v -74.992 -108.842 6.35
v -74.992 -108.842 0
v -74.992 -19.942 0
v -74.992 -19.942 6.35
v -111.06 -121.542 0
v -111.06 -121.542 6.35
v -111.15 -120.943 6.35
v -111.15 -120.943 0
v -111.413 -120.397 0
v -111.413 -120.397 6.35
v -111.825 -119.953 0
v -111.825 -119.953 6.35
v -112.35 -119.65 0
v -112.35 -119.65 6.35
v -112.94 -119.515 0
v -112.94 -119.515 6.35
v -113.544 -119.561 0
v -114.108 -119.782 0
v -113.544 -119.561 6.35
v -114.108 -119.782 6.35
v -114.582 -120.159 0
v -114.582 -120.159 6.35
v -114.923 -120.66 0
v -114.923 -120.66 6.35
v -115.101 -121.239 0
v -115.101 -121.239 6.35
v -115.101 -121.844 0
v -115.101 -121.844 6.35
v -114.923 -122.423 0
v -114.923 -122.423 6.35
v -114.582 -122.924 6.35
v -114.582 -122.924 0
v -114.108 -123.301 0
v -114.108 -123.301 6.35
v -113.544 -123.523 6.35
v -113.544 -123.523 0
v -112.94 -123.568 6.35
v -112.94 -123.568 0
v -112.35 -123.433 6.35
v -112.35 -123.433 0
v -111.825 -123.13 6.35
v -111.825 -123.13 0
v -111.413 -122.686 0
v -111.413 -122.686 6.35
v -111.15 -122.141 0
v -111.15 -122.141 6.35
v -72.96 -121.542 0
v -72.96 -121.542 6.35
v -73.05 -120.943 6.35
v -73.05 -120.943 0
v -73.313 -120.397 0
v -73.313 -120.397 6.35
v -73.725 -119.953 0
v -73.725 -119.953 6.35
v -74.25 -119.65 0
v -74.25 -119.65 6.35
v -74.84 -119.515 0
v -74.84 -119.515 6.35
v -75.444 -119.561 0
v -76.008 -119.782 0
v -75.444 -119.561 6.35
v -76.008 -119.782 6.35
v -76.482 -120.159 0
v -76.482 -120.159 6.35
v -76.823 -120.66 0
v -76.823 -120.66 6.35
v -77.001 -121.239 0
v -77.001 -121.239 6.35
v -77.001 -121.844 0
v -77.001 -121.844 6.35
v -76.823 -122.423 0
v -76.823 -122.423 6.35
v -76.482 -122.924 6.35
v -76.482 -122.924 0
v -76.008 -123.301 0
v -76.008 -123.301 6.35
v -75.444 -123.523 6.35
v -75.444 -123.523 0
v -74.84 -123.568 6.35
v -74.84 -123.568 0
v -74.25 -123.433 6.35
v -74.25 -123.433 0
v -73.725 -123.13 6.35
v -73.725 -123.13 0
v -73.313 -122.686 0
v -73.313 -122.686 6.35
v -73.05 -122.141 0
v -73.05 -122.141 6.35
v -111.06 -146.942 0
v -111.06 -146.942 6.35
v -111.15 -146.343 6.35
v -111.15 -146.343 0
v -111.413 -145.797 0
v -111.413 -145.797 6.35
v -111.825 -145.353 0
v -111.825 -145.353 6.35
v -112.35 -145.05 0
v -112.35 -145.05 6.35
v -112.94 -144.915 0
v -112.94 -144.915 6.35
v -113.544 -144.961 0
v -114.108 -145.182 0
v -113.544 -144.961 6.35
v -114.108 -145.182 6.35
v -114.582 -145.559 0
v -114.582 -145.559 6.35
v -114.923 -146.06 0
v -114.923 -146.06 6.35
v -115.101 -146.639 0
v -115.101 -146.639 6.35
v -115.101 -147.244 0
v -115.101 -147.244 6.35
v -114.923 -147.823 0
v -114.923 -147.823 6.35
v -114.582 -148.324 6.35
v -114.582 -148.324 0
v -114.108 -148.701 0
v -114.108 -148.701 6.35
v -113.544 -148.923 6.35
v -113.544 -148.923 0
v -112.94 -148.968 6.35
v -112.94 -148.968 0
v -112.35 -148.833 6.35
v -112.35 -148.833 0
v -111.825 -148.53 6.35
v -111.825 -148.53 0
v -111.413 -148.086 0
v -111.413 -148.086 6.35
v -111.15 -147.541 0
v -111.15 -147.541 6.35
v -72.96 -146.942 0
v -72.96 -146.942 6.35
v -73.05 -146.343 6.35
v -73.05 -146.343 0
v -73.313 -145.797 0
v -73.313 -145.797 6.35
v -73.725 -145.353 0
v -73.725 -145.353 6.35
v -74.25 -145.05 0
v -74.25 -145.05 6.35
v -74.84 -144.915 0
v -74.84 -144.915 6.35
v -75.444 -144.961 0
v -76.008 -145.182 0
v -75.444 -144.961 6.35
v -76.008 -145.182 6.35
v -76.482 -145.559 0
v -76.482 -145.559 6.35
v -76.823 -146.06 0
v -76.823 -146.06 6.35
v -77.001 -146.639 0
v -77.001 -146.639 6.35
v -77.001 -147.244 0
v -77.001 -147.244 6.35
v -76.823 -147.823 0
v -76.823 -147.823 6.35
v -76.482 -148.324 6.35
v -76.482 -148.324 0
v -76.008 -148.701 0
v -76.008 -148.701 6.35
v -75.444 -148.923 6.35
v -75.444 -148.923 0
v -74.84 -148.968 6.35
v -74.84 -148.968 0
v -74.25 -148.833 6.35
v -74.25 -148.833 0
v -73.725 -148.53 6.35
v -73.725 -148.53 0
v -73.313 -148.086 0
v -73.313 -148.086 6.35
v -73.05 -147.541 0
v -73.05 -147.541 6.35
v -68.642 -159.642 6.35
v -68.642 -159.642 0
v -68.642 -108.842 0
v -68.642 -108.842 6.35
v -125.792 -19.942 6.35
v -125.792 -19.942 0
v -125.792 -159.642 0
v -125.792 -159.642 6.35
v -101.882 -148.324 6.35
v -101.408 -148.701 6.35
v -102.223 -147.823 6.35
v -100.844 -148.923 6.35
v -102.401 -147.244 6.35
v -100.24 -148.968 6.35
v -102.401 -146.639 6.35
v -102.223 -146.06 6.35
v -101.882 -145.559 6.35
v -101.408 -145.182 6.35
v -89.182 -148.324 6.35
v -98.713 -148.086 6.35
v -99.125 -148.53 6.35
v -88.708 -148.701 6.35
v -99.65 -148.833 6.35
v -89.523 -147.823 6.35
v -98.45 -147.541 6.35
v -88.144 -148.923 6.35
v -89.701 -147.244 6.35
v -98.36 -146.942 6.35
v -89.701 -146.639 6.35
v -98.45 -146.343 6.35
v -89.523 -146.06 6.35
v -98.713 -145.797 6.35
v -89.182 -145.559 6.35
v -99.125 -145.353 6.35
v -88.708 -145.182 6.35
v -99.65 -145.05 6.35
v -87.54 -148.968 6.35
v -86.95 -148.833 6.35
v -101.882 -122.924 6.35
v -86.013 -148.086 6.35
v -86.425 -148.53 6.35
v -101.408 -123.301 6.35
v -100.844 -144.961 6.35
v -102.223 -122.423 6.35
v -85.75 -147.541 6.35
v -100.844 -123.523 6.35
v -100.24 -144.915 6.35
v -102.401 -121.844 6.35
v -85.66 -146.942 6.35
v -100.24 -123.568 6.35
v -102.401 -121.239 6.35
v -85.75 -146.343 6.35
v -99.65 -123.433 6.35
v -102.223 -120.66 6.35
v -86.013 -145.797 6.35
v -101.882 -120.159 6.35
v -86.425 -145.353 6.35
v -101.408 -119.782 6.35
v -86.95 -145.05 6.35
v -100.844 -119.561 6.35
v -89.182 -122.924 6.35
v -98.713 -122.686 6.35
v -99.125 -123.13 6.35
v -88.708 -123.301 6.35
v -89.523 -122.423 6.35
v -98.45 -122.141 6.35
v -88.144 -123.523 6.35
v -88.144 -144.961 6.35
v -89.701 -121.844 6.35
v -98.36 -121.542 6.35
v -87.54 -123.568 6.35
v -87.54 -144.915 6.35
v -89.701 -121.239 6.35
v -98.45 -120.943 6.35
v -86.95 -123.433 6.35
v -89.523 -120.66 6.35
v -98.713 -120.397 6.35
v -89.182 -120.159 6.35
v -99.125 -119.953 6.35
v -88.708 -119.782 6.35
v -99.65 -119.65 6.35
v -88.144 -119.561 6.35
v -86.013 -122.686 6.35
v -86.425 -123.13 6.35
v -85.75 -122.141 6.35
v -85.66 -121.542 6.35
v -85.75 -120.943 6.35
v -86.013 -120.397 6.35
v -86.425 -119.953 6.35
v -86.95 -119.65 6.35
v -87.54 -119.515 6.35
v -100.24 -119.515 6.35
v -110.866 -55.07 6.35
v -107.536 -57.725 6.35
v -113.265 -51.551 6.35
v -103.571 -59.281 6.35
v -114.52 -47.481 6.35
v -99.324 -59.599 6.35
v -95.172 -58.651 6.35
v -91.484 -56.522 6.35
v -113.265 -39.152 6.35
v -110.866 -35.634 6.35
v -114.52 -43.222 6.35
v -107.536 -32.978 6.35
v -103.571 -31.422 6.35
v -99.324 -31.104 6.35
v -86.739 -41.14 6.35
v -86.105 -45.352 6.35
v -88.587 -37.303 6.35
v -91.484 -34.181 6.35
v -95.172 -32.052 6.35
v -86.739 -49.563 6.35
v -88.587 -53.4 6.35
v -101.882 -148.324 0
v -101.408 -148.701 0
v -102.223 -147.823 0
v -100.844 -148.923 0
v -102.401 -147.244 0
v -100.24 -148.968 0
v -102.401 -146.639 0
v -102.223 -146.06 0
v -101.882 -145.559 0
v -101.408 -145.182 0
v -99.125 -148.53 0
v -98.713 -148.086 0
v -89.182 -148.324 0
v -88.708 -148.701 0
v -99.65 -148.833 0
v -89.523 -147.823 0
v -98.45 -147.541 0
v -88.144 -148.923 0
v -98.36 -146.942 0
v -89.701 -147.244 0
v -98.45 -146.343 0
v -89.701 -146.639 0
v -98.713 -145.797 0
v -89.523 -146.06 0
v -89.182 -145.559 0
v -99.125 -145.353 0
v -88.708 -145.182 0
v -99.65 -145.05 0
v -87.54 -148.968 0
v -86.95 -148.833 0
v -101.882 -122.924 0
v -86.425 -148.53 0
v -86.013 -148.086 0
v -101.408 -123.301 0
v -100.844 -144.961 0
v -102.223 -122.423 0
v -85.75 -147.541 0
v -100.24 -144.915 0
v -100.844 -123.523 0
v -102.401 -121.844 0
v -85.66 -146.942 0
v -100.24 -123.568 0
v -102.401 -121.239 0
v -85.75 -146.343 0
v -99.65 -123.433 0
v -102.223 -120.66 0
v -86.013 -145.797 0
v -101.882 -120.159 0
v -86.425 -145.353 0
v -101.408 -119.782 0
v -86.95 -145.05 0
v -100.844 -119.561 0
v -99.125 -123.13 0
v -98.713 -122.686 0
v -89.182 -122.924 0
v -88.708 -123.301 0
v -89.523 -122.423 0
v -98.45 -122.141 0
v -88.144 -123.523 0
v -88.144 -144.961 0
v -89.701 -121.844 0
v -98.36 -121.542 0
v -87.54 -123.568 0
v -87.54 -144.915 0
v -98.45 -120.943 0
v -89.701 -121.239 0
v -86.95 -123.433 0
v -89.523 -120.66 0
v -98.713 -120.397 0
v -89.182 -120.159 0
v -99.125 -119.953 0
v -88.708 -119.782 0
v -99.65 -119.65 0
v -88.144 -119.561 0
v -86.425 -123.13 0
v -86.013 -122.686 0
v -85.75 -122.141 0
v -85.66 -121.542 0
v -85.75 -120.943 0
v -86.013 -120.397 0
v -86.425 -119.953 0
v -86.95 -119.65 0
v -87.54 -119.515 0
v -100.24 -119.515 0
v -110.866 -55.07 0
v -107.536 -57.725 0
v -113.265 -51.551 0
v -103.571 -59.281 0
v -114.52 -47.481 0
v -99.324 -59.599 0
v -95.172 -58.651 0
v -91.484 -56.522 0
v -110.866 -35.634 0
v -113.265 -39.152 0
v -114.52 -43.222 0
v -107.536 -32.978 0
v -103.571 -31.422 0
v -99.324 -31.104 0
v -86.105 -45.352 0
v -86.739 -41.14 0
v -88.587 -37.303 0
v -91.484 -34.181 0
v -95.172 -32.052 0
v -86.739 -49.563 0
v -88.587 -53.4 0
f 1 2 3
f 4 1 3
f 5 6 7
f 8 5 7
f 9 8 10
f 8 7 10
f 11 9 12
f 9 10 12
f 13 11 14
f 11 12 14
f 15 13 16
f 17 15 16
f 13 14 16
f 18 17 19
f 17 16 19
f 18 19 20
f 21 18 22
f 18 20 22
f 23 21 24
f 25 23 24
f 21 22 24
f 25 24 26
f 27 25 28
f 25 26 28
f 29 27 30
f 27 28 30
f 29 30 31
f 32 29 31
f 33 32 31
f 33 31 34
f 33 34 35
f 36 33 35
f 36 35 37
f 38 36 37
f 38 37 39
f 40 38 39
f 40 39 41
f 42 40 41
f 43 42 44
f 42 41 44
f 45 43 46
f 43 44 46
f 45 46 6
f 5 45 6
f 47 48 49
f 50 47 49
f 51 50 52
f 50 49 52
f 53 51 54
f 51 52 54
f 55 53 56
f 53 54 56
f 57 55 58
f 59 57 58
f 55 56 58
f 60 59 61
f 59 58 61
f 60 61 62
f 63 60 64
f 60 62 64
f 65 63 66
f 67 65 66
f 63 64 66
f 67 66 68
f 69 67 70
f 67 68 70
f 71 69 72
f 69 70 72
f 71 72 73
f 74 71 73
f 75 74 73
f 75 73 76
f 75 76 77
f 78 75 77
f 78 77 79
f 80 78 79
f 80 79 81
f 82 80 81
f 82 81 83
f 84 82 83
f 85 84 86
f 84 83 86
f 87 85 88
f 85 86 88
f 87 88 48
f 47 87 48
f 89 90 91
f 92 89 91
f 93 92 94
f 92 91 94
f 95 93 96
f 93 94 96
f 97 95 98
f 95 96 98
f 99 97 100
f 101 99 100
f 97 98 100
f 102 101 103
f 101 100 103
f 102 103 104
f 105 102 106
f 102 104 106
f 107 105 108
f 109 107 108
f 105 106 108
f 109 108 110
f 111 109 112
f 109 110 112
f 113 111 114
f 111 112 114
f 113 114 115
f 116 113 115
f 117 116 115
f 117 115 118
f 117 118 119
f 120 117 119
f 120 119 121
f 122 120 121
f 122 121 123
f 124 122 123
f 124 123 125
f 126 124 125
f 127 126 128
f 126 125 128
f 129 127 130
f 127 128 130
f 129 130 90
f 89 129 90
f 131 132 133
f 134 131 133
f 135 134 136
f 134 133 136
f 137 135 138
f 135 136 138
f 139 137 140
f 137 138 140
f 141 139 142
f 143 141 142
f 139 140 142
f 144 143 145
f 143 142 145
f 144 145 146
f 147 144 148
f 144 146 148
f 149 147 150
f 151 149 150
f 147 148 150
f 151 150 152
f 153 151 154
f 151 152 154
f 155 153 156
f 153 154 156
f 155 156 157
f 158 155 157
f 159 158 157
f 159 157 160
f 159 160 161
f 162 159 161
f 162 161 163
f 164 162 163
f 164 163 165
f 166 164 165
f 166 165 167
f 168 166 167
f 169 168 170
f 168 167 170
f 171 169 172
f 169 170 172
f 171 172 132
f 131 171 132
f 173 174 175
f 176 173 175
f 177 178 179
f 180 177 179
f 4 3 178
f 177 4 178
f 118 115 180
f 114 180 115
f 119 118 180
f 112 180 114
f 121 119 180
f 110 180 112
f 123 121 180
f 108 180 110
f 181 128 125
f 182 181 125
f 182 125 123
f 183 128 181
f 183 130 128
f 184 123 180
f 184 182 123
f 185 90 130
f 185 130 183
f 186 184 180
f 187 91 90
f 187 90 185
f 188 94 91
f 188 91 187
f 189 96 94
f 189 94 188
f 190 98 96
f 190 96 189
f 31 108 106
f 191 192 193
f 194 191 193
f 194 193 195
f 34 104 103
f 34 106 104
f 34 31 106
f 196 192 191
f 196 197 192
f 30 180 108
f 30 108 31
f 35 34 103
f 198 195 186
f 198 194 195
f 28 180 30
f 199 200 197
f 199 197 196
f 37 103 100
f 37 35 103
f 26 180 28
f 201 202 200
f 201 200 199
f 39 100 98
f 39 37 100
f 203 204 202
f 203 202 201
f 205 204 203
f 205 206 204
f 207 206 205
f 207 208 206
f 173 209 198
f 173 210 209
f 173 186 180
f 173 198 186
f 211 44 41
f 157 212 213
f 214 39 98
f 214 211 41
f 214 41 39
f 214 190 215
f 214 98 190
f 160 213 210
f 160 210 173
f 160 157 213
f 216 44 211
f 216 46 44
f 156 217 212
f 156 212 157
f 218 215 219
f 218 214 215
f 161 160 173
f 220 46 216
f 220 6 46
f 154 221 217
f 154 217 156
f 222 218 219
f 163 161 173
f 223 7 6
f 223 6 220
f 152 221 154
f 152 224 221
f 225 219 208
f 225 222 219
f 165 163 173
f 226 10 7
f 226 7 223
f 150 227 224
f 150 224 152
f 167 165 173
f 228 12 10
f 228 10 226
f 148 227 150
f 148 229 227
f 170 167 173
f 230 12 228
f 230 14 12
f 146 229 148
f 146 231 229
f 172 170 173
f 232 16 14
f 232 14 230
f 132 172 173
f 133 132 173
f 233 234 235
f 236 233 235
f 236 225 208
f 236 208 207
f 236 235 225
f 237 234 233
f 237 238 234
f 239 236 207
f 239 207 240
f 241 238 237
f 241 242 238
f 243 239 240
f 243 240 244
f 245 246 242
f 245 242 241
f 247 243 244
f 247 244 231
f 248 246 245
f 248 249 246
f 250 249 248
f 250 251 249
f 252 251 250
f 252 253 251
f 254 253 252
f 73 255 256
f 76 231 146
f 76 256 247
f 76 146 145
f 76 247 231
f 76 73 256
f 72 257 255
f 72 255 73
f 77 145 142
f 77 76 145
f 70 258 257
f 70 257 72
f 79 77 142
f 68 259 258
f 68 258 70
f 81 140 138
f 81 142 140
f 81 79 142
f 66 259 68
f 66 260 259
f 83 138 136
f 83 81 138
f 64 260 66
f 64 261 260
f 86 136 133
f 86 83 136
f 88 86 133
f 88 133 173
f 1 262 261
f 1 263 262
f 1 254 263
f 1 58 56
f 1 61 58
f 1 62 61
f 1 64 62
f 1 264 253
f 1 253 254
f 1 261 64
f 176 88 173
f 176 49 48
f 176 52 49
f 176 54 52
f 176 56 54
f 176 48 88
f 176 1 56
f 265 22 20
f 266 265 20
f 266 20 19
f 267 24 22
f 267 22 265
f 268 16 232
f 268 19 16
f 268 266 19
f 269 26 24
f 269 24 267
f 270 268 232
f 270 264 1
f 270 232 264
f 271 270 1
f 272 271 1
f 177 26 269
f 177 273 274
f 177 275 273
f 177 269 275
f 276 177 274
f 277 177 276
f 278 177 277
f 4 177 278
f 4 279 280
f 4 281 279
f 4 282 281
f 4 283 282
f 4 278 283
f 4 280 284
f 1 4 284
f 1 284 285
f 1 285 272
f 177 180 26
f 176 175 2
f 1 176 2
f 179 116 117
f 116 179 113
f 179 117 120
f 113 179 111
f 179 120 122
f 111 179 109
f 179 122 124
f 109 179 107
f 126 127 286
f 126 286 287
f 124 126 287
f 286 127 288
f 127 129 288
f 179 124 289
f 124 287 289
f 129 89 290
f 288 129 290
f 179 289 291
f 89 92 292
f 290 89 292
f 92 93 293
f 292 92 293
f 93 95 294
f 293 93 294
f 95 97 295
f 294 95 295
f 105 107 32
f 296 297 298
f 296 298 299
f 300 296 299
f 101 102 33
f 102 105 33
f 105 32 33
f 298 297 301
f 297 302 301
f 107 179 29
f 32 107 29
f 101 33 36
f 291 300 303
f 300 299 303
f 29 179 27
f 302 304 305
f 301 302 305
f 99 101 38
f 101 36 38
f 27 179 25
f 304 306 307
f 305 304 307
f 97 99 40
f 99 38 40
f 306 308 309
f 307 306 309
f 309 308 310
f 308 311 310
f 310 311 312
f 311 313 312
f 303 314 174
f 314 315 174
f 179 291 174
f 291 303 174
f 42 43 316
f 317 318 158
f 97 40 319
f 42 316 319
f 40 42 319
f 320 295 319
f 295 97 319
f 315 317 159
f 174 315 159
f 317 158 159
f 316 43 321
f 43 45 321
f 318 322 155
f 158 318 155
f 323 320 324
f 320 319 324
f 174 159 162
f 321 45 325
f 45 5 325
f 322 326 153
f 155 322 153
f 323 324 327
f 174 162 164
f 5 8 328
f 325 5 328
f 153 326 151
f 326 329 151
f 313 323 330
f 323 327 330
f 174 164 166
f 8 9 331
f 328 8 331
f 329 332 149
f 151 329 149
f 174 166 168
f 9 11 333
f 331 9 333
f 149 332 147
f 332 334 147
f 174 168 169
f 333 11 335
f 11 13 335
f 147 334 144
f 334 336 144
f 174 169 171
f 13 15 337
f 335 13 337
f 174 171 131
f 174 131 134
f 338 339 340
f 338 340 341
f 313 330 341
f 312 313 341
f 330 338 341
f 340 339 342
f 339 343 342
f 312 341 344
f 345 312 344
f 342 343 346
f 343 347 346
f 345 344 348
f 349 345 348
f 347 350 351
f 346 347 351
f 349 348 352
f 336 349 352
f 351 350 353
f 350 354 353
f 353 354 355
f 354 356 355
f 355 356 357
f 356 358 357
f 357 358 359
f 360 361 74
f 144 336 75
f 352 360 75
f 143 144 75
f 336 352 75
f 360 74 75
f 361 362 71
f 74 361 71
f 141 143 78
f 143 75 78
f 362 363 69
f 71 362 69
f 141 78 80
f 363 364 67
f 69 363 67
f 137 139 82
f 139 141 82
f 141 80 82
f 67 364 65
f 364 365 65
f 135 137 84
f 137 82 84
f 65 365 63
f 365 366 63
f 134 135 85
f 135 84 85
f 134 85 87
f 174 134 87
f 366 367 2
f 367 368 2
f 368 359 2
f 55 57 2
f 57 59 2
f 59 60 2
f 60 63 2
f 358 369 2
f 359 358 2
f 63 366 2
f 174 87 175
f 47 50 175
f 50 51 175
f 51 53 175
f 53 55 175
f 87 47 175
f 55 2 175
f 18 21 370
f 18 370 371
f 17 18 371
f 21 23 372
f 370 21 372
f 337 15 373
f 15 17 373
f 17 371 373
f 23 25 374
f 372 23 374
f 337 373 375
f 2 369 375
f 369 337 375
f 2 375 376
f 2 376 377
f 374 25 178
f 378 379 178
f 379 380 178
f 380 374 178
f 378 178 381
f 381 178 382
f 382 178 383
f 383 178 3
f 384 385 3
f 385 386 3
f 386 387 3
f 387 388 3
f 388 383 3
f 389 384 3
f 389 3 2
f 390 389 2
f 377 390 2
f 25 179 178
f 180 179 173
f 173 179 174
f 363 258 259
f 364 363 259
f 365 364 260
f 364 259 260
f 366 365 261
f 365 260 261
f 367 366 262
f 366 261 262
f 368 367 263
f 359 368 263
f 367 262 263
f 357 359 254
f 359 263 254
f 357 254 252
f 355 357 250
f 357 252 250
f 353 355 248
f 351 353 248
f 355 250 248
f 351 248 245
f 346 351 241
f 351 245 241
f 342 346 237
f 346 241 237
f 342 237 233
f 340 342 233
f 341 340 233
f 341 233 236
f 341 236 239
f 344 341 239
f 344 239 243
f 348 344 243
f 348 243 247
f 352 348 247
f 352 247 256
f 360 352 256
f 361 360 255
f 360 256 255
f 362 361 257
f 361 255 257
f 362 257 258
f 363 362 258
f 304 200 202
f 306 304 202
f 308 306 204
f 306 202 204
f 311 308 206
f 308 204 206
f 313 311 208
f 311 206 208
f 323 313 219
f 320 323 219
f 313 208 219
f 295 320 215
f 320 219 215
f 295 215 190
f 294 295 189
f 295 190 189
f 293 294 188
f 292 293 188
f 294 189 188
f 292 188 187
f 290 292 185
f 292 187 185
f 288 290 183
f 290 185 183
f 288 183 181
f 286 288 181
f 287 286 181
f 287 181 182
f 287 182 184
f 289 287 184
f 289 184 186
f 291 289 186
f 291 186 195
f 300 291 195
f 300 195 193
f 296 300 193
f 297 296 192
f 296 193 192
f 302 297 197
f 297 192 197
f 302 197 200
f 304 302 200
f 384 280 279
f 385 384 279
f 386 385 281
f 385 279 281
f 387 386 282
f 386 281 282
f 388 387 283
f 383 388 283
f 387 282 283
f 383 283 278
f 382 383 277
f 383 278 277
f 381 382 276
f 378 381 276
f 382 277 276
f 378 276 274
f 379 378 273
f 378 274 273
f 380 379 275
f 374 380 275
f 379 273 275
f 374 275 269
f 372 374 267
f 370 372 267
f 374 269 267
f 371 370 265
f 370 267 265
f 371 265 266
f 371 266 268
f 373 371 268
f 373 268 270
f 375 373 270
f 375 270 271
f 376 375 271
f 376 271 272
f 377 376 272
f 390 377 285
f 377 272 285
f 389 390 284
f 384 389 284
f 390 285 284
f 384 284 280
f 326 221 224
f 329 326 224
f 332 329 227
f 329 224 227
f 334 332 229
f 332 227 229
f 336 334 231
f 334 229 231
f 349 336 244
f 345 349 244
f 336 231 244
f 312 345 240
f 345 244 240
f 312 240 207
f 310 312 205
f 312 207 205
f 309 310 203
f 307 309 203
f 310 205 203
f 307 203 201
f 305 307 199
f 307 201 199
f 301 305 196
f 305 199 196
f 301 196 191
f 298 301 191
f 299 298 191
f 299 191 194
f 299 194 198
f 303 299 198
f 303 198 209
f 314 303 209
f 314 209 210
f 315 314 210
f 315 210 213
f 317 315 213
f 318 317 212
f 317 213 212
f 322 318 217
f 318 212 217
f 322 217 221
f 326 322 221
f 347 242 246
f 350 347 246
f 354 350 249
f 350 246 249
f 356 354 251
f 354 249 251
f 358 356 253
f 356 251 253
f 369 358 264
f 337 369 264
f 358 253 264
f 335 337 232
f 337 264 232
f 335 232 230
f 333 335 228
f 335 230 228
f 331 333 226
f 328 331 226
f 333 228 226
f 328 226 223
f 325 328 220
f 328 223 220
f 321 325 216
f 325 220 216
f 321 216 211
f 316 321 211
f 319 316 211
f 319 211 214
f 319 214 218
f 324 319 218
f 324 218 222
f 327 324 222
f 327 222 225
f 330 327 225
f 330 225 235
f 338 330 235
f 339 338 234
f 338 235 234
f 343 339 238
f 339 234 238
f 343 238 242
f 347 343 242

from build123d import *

# Parameters (mm, degrees)
BOSS_EXTRUDE1_DEPTH = 6.35
SKETCH3_R           = 14.2875
SKETCH3_R_2         = 2.032
CUT_EXTRUDE1_DEPTH  = 6.35


with BuildPart() as part:
    # Sketch2 → Boss-Extrude1 (new body)
    with BuildSketch(Plane.XY):
        Polygon((-125.79203122, -159.641560721), (-74.99203122, -159.641560721), (-68.64203122, -159.641560721), (-68.64203122, -108.841560721), (-74.99203122, -108.841560721), (-74.99203122, -19.941560721), (-125.79203122, -19.941560721), align=None)
    extrude(amount=BOSS_EXTRUDE1_DEPTH)

    # Sketch3 → Cut-Extrude1 (cut)
    with BuildSketch(Plane.XY.offset(6.35)):
        with Locations((-100.39203122, -45.351567892)):
            Circle(SKETCH3_R)
        with Locations((-87.69203122, -146.941560721)):
            Circle(SKETCH3_R_2)
        with Locations((-113.09203122, -146.941560721)):
            Circle(SKETCH3_R_2)
        with Locations((-100.39203122, -146.941560721)):
            Circle(SKETCH3_R_2)
        with Locations((-74.99203122, -146.941560721)):
            Circle(SKETCH3_R_2)
        with Locations((-113.09203122, -121.541560721)):
            Circle(SKETCH3_R_2)
        with Locations((-87.69203122, -121.541560721)):
            Circle(SKETCH3_R_2)
        with Locations((-74.99203122, -121.541560721)):
            Circle(SKETCH3_R_2)
        with Locations((-100.39203122, -121.541560721)):
            Circle(SKETCH3_R_2)
    extrude(amount=-CUT_EXTRUDE1_DEPTH, mode=Mode.SUBTRACT)


solid = part.part
